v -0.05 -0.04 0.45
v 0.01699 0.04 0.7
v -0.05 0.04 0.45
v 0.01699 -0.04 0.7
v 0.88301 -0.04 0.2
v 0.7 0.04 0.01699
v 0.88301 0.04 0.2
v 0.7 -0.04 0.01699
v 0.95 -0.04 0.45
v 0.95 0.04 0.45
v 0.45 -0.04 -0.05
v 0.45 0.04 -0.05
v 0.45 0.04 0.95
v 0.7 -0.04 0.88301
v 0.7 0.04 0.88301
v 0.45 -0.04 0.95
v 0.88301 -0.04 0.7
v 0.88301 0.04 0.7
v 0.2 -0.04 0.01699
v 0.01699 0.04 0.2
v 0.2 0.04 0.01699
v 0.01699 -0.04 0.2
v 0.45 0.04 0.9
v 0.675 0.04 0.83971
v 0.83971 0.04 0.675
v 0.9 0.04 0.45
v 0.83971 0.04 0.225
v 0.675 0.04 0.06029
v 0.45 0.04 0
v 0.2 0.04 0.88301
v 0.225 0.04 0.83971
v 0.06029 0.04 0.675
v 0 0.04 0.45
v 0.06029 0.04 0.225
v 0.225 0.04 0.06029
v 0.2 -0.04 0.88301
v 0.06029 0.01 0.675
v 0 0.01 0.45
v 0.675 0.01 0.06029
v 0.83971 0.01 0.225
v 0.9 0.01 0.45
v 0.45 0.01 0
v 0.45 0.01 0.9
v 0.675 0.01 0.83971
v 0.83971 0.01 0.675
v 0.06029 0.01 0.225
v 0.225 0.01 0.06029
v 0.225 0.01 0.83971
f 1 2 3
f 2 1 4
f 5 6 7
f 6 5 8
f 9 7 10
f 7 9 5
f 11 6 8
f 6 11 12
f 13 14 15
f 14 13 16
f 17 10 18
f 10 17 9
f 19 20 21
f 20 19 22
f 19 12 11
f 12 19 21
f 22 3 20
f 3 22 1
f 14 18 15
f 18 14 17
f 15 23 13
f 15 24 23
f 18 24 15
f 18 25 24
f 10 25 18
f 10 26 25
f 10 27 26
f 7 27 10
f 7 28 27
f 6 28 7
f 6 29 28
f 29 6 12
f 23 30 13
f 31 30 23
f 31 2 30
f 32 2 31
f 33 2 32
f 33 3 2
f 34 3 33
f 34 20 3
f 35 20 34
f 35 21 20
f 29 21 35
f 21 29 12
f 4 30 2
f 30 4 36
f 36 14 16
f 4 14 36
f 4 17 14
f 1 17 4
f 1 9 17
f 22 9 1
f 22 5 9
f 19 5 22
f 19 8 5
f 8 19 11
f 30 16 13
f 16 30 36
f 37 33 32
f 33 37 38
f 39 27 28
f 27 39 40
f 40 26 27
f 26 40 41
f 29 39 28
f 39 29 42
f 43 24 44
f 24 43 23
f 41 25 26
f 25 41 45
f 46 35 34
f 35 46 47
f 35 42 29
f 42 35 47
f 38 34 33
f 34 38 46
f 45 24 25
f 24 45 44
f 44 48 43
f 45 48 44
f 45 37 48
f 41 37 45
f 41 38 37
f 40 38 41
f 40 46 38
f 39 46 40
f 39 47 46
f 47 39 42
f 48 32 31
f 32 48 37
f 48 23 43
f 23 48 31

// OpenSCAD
outer_radius = 0.5;
edge_thickness = 0.05;
depth = 0.08;

inner_radius = outer_radius - edge_thickness;

translate([inner_radius, 0, inner_radius]) { // fit clock face along axis
    rotate([-90, 0, 0]) {
        difference() {
            cylinder(h=depth, r1=outer_radius, r2=outer_radius, center=true, $fn=12);
            translate([0, 0, edge_thickness]) {
                cylinder(h=depth, r1=inner_radius, r2=inner_radius, center=true, $fn=12);
            }
        }
    }
}
